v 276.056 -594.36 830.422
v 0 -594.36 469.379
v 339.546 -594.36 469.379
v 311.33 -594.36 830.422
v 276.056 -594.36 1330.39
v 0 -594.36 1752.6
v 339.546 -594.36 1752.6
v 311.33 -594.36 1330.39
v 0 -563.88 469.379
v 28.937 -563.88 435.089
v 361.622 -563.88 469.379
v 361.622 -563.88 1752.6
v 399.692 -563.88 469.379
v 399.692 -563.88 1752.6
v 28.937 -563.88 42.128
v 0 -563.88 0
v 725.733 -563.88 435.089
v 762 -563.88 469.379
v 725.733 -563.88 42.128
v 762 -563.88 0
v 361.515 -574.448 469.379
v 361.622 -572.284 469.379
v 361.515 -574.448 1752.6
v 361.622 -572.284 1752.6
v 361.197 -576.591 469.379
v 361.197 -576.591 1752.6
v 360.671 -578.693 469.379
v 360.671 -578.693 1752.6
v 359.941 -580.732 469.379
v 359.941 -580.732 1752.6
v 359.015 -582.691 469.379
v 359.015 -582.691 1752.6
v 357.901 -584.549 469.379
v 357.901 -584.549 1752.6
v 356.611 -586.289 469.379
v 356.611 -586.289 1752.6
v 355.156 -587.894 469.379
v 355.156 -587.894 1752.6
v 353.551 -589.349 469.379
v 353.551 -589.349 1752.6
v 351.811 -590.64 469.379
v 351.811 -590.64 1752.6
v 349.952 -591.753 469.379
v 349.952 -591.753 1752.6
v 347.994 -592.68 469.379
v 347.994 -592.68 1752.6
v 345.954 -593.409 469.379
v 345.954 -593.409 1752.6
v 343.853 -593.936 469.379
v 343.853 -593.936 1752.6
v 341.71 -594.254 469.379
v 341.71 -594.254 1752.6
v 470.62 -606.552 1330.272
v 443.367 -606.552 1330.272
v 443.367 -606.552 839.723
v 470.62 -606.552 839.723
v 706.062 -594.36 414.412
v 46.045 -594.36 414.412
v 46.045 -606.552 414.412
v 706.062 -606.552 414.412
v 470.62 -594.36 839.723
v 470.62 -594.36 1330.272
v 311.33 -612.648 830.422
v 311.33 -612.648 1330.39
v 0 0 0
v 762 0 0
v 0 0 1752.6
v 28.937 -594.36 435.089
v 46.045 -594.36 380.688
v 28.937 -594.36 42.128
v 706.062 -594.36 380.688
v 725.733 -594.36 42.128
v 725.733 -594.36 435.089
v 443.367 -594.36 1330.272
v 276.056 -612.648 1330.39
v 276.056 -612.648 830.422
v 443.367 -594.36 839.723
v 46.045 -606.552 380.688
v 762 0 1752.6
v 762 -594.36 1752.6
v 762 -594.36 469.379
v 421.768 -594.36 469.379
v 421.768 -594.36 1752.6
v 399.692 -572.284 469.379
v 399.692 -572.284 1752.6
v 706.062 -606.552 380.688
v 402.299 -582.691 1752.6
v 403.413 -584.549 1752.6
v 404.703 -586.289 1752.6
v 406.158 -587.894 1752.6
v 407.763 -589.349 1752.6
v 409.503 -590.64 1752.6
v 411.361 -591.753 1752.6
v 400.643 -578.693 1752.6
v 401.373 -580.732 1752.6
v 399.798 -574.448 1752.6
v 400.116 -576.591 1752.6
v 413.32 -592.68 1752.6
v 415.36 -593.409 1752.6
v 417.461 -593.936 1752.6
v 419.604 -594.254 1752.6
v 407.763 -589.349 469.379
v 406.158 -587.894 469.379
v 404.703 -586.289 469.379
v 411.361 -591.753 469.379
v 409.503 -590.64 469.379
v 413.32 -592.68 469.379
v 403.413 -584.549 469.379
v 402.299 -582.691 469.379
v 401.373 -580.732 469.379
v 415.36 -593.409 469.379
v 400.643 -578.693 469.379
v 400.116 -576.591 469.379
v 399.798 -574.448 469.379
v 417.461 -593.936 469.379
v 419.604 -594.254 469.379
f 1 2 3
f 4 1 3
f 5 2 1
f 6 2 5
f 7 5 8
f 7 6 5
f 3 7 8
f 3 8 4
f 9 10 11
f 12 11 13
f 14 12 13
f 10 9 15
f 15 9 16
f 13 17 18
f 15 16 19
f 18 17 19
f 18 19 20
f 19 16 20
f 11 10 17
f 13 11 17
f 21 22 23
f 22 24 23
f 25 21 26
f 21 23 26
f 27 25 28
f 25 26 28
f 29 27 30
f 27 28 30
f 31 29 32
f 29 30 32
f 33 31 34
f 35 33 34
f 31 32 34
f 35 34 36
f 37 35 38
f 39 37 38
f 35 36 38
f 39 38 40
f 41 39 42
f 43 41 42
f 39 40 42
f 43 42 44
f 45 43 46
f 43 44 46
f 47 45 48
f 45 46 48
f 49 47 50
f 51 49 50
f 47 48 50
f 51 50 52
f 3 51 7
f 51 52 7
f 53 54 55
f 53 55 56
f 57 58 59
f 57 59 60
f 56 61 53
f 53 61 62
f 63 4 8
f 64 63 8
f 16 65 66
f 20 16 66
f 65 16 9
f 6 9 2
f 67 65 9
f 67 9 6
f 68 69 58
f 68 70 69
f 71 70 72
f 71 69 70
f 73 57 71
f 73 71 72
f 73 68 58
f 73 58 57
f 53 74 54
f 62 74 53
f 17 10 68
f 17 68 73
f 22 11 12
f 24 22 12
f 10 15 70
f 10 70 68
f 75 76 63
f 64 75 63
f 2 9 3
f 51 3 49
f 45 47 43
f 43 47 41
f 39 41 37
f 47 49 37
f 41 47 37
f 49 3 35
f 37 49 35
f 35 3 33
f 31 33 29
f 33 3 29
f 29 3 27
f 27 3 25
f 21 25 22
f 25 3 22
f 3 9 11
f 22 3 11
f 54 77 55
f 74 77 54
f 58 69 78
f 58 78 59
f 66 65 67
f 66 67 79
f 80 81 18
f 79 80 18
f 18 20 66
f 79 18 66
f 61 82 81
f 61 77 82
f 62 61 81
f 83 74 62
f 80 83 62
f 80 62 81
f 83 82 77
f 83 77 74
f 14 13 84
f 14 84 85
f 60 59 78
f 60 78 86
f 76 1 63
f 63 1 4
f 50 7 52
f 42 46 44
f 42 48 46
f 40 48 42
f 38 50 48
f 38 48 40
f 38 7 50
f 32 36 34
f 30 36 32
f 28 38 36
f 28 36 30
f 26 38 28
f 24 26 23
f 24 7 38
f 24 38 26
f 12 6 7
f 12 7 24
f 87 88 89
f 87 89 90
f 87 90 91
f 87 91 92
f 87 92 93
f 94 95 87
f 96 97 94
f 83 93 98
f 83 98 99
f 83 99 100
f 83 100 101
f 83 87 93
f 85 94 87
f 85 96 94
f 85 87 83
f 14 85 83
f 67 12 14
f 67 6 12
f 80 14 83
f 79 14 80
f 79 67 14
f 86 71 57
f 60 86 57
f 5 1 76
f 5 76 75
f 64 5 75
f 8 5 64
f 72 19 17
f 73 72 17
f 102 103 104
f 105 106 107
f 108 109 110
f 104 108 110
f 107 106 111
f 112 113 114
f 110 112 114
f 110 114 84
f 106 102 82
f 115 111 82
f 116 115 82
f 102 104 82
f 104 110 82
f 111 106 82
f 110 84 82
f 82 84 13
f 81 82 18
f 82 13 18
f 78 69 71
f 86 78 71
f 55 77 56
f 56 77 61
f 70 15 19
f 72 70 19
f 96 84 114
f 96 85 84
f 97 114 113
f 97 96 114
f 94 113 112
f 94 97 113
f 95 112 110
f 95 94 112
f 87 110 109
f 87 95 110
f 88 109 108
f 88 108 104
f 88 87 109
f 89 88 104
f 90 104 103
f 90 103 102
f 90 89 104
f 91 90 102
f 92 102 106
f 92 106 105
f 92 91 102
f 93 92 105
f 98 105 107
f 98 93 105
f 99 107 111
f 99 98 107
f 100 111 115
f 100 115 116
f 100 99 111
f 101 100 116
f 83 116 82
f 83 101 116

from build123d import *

# Parameters (mm, degrees)
F0_W      = 762
F0_H      = 563.88
F1_DEPTH  = 1752.6
F2_W      = 696.7959
F2_H      = 392.960511
F3_DEPTH  = 30.48
F4_W      = 361.621648
F4_H      = 1283.220664
F4_W_2    = 362.307822
F5_DEPTH  = 30.48
F6_R      = 22.075569
F7_W      = 35.273701
F7_H      = 499.968111
F8_DEPTH  = 18.288
F9_W      = 27.252704
F9_H      = 490.54879
F10_DEPTH = 12.192
F11_W     = 660.017151
F11_H     = 33.723503
F12_DEPTH = 12.192


with BuildPart() as f1:
    # F0 (on Top) → F1 (new body)
    with BuildSketch(Plane.XY):
        with Locations((381, -281.94)):
            Rectangle(F0_W, F0_H)
    extrude(amount=F1_DEPTH)

    # F2 (on face) → F3 (join)
    with BuildSketch(Plane.XZ.offset(563.88)):
        with Locations((377.334675, 238.608349)):
            Rectangle(F2_W, F2_H)
    extrude(amount=F3_DEPTH)

    # F4 (on face) → F5 (join)
    with BuildSketch(Plane.XZ.offset(563.88)):
        with Locations((180.810824, 1110.989668)):
            Rectangle(F4_W, F4_H)
        with Locations((580.846089, 1110.989668)):
            Rectangle(F4_W_2, F4_H)
    extrude(amount=F5_DEPTH)

    # F6
    f6_edges = [f1.edges().sort_by_distance(p)[0] for p in [
        (361.621648, -594.36, 1110.989668),
        (399.692178, -594.36, 1110.989668),
    ]]
    fillet(f6_edges, radius=F6_R)

    # F7 (on face) → F8 (join)
    with BuildSketch(Plane.XZ.offset(594.36)):
        with Locations((293.69308, 1080.406278)):
            Rectangle(F7_W, F7_H)
    extrude(amount=F8_DEPTH)

    # F9 (on face) → F10 (join)
    with BuildSketch(Plane.XZ.offset(594.36)):
        with Locations((456.993356, 1084.997684)):
            Rectangle(F9_W, F9_H)
    extrude(amount=F10_DEPTH)

    # F11 (on face) → F12 (join)
    with BuildSketch(Plane.XZ.offset(594.36)):
        with Locations((376.0538, 397.549763)):
            Rectangle(F11_W, F11_H)
    extrude(amount=F12_DEPTH)


solid = f1.part
